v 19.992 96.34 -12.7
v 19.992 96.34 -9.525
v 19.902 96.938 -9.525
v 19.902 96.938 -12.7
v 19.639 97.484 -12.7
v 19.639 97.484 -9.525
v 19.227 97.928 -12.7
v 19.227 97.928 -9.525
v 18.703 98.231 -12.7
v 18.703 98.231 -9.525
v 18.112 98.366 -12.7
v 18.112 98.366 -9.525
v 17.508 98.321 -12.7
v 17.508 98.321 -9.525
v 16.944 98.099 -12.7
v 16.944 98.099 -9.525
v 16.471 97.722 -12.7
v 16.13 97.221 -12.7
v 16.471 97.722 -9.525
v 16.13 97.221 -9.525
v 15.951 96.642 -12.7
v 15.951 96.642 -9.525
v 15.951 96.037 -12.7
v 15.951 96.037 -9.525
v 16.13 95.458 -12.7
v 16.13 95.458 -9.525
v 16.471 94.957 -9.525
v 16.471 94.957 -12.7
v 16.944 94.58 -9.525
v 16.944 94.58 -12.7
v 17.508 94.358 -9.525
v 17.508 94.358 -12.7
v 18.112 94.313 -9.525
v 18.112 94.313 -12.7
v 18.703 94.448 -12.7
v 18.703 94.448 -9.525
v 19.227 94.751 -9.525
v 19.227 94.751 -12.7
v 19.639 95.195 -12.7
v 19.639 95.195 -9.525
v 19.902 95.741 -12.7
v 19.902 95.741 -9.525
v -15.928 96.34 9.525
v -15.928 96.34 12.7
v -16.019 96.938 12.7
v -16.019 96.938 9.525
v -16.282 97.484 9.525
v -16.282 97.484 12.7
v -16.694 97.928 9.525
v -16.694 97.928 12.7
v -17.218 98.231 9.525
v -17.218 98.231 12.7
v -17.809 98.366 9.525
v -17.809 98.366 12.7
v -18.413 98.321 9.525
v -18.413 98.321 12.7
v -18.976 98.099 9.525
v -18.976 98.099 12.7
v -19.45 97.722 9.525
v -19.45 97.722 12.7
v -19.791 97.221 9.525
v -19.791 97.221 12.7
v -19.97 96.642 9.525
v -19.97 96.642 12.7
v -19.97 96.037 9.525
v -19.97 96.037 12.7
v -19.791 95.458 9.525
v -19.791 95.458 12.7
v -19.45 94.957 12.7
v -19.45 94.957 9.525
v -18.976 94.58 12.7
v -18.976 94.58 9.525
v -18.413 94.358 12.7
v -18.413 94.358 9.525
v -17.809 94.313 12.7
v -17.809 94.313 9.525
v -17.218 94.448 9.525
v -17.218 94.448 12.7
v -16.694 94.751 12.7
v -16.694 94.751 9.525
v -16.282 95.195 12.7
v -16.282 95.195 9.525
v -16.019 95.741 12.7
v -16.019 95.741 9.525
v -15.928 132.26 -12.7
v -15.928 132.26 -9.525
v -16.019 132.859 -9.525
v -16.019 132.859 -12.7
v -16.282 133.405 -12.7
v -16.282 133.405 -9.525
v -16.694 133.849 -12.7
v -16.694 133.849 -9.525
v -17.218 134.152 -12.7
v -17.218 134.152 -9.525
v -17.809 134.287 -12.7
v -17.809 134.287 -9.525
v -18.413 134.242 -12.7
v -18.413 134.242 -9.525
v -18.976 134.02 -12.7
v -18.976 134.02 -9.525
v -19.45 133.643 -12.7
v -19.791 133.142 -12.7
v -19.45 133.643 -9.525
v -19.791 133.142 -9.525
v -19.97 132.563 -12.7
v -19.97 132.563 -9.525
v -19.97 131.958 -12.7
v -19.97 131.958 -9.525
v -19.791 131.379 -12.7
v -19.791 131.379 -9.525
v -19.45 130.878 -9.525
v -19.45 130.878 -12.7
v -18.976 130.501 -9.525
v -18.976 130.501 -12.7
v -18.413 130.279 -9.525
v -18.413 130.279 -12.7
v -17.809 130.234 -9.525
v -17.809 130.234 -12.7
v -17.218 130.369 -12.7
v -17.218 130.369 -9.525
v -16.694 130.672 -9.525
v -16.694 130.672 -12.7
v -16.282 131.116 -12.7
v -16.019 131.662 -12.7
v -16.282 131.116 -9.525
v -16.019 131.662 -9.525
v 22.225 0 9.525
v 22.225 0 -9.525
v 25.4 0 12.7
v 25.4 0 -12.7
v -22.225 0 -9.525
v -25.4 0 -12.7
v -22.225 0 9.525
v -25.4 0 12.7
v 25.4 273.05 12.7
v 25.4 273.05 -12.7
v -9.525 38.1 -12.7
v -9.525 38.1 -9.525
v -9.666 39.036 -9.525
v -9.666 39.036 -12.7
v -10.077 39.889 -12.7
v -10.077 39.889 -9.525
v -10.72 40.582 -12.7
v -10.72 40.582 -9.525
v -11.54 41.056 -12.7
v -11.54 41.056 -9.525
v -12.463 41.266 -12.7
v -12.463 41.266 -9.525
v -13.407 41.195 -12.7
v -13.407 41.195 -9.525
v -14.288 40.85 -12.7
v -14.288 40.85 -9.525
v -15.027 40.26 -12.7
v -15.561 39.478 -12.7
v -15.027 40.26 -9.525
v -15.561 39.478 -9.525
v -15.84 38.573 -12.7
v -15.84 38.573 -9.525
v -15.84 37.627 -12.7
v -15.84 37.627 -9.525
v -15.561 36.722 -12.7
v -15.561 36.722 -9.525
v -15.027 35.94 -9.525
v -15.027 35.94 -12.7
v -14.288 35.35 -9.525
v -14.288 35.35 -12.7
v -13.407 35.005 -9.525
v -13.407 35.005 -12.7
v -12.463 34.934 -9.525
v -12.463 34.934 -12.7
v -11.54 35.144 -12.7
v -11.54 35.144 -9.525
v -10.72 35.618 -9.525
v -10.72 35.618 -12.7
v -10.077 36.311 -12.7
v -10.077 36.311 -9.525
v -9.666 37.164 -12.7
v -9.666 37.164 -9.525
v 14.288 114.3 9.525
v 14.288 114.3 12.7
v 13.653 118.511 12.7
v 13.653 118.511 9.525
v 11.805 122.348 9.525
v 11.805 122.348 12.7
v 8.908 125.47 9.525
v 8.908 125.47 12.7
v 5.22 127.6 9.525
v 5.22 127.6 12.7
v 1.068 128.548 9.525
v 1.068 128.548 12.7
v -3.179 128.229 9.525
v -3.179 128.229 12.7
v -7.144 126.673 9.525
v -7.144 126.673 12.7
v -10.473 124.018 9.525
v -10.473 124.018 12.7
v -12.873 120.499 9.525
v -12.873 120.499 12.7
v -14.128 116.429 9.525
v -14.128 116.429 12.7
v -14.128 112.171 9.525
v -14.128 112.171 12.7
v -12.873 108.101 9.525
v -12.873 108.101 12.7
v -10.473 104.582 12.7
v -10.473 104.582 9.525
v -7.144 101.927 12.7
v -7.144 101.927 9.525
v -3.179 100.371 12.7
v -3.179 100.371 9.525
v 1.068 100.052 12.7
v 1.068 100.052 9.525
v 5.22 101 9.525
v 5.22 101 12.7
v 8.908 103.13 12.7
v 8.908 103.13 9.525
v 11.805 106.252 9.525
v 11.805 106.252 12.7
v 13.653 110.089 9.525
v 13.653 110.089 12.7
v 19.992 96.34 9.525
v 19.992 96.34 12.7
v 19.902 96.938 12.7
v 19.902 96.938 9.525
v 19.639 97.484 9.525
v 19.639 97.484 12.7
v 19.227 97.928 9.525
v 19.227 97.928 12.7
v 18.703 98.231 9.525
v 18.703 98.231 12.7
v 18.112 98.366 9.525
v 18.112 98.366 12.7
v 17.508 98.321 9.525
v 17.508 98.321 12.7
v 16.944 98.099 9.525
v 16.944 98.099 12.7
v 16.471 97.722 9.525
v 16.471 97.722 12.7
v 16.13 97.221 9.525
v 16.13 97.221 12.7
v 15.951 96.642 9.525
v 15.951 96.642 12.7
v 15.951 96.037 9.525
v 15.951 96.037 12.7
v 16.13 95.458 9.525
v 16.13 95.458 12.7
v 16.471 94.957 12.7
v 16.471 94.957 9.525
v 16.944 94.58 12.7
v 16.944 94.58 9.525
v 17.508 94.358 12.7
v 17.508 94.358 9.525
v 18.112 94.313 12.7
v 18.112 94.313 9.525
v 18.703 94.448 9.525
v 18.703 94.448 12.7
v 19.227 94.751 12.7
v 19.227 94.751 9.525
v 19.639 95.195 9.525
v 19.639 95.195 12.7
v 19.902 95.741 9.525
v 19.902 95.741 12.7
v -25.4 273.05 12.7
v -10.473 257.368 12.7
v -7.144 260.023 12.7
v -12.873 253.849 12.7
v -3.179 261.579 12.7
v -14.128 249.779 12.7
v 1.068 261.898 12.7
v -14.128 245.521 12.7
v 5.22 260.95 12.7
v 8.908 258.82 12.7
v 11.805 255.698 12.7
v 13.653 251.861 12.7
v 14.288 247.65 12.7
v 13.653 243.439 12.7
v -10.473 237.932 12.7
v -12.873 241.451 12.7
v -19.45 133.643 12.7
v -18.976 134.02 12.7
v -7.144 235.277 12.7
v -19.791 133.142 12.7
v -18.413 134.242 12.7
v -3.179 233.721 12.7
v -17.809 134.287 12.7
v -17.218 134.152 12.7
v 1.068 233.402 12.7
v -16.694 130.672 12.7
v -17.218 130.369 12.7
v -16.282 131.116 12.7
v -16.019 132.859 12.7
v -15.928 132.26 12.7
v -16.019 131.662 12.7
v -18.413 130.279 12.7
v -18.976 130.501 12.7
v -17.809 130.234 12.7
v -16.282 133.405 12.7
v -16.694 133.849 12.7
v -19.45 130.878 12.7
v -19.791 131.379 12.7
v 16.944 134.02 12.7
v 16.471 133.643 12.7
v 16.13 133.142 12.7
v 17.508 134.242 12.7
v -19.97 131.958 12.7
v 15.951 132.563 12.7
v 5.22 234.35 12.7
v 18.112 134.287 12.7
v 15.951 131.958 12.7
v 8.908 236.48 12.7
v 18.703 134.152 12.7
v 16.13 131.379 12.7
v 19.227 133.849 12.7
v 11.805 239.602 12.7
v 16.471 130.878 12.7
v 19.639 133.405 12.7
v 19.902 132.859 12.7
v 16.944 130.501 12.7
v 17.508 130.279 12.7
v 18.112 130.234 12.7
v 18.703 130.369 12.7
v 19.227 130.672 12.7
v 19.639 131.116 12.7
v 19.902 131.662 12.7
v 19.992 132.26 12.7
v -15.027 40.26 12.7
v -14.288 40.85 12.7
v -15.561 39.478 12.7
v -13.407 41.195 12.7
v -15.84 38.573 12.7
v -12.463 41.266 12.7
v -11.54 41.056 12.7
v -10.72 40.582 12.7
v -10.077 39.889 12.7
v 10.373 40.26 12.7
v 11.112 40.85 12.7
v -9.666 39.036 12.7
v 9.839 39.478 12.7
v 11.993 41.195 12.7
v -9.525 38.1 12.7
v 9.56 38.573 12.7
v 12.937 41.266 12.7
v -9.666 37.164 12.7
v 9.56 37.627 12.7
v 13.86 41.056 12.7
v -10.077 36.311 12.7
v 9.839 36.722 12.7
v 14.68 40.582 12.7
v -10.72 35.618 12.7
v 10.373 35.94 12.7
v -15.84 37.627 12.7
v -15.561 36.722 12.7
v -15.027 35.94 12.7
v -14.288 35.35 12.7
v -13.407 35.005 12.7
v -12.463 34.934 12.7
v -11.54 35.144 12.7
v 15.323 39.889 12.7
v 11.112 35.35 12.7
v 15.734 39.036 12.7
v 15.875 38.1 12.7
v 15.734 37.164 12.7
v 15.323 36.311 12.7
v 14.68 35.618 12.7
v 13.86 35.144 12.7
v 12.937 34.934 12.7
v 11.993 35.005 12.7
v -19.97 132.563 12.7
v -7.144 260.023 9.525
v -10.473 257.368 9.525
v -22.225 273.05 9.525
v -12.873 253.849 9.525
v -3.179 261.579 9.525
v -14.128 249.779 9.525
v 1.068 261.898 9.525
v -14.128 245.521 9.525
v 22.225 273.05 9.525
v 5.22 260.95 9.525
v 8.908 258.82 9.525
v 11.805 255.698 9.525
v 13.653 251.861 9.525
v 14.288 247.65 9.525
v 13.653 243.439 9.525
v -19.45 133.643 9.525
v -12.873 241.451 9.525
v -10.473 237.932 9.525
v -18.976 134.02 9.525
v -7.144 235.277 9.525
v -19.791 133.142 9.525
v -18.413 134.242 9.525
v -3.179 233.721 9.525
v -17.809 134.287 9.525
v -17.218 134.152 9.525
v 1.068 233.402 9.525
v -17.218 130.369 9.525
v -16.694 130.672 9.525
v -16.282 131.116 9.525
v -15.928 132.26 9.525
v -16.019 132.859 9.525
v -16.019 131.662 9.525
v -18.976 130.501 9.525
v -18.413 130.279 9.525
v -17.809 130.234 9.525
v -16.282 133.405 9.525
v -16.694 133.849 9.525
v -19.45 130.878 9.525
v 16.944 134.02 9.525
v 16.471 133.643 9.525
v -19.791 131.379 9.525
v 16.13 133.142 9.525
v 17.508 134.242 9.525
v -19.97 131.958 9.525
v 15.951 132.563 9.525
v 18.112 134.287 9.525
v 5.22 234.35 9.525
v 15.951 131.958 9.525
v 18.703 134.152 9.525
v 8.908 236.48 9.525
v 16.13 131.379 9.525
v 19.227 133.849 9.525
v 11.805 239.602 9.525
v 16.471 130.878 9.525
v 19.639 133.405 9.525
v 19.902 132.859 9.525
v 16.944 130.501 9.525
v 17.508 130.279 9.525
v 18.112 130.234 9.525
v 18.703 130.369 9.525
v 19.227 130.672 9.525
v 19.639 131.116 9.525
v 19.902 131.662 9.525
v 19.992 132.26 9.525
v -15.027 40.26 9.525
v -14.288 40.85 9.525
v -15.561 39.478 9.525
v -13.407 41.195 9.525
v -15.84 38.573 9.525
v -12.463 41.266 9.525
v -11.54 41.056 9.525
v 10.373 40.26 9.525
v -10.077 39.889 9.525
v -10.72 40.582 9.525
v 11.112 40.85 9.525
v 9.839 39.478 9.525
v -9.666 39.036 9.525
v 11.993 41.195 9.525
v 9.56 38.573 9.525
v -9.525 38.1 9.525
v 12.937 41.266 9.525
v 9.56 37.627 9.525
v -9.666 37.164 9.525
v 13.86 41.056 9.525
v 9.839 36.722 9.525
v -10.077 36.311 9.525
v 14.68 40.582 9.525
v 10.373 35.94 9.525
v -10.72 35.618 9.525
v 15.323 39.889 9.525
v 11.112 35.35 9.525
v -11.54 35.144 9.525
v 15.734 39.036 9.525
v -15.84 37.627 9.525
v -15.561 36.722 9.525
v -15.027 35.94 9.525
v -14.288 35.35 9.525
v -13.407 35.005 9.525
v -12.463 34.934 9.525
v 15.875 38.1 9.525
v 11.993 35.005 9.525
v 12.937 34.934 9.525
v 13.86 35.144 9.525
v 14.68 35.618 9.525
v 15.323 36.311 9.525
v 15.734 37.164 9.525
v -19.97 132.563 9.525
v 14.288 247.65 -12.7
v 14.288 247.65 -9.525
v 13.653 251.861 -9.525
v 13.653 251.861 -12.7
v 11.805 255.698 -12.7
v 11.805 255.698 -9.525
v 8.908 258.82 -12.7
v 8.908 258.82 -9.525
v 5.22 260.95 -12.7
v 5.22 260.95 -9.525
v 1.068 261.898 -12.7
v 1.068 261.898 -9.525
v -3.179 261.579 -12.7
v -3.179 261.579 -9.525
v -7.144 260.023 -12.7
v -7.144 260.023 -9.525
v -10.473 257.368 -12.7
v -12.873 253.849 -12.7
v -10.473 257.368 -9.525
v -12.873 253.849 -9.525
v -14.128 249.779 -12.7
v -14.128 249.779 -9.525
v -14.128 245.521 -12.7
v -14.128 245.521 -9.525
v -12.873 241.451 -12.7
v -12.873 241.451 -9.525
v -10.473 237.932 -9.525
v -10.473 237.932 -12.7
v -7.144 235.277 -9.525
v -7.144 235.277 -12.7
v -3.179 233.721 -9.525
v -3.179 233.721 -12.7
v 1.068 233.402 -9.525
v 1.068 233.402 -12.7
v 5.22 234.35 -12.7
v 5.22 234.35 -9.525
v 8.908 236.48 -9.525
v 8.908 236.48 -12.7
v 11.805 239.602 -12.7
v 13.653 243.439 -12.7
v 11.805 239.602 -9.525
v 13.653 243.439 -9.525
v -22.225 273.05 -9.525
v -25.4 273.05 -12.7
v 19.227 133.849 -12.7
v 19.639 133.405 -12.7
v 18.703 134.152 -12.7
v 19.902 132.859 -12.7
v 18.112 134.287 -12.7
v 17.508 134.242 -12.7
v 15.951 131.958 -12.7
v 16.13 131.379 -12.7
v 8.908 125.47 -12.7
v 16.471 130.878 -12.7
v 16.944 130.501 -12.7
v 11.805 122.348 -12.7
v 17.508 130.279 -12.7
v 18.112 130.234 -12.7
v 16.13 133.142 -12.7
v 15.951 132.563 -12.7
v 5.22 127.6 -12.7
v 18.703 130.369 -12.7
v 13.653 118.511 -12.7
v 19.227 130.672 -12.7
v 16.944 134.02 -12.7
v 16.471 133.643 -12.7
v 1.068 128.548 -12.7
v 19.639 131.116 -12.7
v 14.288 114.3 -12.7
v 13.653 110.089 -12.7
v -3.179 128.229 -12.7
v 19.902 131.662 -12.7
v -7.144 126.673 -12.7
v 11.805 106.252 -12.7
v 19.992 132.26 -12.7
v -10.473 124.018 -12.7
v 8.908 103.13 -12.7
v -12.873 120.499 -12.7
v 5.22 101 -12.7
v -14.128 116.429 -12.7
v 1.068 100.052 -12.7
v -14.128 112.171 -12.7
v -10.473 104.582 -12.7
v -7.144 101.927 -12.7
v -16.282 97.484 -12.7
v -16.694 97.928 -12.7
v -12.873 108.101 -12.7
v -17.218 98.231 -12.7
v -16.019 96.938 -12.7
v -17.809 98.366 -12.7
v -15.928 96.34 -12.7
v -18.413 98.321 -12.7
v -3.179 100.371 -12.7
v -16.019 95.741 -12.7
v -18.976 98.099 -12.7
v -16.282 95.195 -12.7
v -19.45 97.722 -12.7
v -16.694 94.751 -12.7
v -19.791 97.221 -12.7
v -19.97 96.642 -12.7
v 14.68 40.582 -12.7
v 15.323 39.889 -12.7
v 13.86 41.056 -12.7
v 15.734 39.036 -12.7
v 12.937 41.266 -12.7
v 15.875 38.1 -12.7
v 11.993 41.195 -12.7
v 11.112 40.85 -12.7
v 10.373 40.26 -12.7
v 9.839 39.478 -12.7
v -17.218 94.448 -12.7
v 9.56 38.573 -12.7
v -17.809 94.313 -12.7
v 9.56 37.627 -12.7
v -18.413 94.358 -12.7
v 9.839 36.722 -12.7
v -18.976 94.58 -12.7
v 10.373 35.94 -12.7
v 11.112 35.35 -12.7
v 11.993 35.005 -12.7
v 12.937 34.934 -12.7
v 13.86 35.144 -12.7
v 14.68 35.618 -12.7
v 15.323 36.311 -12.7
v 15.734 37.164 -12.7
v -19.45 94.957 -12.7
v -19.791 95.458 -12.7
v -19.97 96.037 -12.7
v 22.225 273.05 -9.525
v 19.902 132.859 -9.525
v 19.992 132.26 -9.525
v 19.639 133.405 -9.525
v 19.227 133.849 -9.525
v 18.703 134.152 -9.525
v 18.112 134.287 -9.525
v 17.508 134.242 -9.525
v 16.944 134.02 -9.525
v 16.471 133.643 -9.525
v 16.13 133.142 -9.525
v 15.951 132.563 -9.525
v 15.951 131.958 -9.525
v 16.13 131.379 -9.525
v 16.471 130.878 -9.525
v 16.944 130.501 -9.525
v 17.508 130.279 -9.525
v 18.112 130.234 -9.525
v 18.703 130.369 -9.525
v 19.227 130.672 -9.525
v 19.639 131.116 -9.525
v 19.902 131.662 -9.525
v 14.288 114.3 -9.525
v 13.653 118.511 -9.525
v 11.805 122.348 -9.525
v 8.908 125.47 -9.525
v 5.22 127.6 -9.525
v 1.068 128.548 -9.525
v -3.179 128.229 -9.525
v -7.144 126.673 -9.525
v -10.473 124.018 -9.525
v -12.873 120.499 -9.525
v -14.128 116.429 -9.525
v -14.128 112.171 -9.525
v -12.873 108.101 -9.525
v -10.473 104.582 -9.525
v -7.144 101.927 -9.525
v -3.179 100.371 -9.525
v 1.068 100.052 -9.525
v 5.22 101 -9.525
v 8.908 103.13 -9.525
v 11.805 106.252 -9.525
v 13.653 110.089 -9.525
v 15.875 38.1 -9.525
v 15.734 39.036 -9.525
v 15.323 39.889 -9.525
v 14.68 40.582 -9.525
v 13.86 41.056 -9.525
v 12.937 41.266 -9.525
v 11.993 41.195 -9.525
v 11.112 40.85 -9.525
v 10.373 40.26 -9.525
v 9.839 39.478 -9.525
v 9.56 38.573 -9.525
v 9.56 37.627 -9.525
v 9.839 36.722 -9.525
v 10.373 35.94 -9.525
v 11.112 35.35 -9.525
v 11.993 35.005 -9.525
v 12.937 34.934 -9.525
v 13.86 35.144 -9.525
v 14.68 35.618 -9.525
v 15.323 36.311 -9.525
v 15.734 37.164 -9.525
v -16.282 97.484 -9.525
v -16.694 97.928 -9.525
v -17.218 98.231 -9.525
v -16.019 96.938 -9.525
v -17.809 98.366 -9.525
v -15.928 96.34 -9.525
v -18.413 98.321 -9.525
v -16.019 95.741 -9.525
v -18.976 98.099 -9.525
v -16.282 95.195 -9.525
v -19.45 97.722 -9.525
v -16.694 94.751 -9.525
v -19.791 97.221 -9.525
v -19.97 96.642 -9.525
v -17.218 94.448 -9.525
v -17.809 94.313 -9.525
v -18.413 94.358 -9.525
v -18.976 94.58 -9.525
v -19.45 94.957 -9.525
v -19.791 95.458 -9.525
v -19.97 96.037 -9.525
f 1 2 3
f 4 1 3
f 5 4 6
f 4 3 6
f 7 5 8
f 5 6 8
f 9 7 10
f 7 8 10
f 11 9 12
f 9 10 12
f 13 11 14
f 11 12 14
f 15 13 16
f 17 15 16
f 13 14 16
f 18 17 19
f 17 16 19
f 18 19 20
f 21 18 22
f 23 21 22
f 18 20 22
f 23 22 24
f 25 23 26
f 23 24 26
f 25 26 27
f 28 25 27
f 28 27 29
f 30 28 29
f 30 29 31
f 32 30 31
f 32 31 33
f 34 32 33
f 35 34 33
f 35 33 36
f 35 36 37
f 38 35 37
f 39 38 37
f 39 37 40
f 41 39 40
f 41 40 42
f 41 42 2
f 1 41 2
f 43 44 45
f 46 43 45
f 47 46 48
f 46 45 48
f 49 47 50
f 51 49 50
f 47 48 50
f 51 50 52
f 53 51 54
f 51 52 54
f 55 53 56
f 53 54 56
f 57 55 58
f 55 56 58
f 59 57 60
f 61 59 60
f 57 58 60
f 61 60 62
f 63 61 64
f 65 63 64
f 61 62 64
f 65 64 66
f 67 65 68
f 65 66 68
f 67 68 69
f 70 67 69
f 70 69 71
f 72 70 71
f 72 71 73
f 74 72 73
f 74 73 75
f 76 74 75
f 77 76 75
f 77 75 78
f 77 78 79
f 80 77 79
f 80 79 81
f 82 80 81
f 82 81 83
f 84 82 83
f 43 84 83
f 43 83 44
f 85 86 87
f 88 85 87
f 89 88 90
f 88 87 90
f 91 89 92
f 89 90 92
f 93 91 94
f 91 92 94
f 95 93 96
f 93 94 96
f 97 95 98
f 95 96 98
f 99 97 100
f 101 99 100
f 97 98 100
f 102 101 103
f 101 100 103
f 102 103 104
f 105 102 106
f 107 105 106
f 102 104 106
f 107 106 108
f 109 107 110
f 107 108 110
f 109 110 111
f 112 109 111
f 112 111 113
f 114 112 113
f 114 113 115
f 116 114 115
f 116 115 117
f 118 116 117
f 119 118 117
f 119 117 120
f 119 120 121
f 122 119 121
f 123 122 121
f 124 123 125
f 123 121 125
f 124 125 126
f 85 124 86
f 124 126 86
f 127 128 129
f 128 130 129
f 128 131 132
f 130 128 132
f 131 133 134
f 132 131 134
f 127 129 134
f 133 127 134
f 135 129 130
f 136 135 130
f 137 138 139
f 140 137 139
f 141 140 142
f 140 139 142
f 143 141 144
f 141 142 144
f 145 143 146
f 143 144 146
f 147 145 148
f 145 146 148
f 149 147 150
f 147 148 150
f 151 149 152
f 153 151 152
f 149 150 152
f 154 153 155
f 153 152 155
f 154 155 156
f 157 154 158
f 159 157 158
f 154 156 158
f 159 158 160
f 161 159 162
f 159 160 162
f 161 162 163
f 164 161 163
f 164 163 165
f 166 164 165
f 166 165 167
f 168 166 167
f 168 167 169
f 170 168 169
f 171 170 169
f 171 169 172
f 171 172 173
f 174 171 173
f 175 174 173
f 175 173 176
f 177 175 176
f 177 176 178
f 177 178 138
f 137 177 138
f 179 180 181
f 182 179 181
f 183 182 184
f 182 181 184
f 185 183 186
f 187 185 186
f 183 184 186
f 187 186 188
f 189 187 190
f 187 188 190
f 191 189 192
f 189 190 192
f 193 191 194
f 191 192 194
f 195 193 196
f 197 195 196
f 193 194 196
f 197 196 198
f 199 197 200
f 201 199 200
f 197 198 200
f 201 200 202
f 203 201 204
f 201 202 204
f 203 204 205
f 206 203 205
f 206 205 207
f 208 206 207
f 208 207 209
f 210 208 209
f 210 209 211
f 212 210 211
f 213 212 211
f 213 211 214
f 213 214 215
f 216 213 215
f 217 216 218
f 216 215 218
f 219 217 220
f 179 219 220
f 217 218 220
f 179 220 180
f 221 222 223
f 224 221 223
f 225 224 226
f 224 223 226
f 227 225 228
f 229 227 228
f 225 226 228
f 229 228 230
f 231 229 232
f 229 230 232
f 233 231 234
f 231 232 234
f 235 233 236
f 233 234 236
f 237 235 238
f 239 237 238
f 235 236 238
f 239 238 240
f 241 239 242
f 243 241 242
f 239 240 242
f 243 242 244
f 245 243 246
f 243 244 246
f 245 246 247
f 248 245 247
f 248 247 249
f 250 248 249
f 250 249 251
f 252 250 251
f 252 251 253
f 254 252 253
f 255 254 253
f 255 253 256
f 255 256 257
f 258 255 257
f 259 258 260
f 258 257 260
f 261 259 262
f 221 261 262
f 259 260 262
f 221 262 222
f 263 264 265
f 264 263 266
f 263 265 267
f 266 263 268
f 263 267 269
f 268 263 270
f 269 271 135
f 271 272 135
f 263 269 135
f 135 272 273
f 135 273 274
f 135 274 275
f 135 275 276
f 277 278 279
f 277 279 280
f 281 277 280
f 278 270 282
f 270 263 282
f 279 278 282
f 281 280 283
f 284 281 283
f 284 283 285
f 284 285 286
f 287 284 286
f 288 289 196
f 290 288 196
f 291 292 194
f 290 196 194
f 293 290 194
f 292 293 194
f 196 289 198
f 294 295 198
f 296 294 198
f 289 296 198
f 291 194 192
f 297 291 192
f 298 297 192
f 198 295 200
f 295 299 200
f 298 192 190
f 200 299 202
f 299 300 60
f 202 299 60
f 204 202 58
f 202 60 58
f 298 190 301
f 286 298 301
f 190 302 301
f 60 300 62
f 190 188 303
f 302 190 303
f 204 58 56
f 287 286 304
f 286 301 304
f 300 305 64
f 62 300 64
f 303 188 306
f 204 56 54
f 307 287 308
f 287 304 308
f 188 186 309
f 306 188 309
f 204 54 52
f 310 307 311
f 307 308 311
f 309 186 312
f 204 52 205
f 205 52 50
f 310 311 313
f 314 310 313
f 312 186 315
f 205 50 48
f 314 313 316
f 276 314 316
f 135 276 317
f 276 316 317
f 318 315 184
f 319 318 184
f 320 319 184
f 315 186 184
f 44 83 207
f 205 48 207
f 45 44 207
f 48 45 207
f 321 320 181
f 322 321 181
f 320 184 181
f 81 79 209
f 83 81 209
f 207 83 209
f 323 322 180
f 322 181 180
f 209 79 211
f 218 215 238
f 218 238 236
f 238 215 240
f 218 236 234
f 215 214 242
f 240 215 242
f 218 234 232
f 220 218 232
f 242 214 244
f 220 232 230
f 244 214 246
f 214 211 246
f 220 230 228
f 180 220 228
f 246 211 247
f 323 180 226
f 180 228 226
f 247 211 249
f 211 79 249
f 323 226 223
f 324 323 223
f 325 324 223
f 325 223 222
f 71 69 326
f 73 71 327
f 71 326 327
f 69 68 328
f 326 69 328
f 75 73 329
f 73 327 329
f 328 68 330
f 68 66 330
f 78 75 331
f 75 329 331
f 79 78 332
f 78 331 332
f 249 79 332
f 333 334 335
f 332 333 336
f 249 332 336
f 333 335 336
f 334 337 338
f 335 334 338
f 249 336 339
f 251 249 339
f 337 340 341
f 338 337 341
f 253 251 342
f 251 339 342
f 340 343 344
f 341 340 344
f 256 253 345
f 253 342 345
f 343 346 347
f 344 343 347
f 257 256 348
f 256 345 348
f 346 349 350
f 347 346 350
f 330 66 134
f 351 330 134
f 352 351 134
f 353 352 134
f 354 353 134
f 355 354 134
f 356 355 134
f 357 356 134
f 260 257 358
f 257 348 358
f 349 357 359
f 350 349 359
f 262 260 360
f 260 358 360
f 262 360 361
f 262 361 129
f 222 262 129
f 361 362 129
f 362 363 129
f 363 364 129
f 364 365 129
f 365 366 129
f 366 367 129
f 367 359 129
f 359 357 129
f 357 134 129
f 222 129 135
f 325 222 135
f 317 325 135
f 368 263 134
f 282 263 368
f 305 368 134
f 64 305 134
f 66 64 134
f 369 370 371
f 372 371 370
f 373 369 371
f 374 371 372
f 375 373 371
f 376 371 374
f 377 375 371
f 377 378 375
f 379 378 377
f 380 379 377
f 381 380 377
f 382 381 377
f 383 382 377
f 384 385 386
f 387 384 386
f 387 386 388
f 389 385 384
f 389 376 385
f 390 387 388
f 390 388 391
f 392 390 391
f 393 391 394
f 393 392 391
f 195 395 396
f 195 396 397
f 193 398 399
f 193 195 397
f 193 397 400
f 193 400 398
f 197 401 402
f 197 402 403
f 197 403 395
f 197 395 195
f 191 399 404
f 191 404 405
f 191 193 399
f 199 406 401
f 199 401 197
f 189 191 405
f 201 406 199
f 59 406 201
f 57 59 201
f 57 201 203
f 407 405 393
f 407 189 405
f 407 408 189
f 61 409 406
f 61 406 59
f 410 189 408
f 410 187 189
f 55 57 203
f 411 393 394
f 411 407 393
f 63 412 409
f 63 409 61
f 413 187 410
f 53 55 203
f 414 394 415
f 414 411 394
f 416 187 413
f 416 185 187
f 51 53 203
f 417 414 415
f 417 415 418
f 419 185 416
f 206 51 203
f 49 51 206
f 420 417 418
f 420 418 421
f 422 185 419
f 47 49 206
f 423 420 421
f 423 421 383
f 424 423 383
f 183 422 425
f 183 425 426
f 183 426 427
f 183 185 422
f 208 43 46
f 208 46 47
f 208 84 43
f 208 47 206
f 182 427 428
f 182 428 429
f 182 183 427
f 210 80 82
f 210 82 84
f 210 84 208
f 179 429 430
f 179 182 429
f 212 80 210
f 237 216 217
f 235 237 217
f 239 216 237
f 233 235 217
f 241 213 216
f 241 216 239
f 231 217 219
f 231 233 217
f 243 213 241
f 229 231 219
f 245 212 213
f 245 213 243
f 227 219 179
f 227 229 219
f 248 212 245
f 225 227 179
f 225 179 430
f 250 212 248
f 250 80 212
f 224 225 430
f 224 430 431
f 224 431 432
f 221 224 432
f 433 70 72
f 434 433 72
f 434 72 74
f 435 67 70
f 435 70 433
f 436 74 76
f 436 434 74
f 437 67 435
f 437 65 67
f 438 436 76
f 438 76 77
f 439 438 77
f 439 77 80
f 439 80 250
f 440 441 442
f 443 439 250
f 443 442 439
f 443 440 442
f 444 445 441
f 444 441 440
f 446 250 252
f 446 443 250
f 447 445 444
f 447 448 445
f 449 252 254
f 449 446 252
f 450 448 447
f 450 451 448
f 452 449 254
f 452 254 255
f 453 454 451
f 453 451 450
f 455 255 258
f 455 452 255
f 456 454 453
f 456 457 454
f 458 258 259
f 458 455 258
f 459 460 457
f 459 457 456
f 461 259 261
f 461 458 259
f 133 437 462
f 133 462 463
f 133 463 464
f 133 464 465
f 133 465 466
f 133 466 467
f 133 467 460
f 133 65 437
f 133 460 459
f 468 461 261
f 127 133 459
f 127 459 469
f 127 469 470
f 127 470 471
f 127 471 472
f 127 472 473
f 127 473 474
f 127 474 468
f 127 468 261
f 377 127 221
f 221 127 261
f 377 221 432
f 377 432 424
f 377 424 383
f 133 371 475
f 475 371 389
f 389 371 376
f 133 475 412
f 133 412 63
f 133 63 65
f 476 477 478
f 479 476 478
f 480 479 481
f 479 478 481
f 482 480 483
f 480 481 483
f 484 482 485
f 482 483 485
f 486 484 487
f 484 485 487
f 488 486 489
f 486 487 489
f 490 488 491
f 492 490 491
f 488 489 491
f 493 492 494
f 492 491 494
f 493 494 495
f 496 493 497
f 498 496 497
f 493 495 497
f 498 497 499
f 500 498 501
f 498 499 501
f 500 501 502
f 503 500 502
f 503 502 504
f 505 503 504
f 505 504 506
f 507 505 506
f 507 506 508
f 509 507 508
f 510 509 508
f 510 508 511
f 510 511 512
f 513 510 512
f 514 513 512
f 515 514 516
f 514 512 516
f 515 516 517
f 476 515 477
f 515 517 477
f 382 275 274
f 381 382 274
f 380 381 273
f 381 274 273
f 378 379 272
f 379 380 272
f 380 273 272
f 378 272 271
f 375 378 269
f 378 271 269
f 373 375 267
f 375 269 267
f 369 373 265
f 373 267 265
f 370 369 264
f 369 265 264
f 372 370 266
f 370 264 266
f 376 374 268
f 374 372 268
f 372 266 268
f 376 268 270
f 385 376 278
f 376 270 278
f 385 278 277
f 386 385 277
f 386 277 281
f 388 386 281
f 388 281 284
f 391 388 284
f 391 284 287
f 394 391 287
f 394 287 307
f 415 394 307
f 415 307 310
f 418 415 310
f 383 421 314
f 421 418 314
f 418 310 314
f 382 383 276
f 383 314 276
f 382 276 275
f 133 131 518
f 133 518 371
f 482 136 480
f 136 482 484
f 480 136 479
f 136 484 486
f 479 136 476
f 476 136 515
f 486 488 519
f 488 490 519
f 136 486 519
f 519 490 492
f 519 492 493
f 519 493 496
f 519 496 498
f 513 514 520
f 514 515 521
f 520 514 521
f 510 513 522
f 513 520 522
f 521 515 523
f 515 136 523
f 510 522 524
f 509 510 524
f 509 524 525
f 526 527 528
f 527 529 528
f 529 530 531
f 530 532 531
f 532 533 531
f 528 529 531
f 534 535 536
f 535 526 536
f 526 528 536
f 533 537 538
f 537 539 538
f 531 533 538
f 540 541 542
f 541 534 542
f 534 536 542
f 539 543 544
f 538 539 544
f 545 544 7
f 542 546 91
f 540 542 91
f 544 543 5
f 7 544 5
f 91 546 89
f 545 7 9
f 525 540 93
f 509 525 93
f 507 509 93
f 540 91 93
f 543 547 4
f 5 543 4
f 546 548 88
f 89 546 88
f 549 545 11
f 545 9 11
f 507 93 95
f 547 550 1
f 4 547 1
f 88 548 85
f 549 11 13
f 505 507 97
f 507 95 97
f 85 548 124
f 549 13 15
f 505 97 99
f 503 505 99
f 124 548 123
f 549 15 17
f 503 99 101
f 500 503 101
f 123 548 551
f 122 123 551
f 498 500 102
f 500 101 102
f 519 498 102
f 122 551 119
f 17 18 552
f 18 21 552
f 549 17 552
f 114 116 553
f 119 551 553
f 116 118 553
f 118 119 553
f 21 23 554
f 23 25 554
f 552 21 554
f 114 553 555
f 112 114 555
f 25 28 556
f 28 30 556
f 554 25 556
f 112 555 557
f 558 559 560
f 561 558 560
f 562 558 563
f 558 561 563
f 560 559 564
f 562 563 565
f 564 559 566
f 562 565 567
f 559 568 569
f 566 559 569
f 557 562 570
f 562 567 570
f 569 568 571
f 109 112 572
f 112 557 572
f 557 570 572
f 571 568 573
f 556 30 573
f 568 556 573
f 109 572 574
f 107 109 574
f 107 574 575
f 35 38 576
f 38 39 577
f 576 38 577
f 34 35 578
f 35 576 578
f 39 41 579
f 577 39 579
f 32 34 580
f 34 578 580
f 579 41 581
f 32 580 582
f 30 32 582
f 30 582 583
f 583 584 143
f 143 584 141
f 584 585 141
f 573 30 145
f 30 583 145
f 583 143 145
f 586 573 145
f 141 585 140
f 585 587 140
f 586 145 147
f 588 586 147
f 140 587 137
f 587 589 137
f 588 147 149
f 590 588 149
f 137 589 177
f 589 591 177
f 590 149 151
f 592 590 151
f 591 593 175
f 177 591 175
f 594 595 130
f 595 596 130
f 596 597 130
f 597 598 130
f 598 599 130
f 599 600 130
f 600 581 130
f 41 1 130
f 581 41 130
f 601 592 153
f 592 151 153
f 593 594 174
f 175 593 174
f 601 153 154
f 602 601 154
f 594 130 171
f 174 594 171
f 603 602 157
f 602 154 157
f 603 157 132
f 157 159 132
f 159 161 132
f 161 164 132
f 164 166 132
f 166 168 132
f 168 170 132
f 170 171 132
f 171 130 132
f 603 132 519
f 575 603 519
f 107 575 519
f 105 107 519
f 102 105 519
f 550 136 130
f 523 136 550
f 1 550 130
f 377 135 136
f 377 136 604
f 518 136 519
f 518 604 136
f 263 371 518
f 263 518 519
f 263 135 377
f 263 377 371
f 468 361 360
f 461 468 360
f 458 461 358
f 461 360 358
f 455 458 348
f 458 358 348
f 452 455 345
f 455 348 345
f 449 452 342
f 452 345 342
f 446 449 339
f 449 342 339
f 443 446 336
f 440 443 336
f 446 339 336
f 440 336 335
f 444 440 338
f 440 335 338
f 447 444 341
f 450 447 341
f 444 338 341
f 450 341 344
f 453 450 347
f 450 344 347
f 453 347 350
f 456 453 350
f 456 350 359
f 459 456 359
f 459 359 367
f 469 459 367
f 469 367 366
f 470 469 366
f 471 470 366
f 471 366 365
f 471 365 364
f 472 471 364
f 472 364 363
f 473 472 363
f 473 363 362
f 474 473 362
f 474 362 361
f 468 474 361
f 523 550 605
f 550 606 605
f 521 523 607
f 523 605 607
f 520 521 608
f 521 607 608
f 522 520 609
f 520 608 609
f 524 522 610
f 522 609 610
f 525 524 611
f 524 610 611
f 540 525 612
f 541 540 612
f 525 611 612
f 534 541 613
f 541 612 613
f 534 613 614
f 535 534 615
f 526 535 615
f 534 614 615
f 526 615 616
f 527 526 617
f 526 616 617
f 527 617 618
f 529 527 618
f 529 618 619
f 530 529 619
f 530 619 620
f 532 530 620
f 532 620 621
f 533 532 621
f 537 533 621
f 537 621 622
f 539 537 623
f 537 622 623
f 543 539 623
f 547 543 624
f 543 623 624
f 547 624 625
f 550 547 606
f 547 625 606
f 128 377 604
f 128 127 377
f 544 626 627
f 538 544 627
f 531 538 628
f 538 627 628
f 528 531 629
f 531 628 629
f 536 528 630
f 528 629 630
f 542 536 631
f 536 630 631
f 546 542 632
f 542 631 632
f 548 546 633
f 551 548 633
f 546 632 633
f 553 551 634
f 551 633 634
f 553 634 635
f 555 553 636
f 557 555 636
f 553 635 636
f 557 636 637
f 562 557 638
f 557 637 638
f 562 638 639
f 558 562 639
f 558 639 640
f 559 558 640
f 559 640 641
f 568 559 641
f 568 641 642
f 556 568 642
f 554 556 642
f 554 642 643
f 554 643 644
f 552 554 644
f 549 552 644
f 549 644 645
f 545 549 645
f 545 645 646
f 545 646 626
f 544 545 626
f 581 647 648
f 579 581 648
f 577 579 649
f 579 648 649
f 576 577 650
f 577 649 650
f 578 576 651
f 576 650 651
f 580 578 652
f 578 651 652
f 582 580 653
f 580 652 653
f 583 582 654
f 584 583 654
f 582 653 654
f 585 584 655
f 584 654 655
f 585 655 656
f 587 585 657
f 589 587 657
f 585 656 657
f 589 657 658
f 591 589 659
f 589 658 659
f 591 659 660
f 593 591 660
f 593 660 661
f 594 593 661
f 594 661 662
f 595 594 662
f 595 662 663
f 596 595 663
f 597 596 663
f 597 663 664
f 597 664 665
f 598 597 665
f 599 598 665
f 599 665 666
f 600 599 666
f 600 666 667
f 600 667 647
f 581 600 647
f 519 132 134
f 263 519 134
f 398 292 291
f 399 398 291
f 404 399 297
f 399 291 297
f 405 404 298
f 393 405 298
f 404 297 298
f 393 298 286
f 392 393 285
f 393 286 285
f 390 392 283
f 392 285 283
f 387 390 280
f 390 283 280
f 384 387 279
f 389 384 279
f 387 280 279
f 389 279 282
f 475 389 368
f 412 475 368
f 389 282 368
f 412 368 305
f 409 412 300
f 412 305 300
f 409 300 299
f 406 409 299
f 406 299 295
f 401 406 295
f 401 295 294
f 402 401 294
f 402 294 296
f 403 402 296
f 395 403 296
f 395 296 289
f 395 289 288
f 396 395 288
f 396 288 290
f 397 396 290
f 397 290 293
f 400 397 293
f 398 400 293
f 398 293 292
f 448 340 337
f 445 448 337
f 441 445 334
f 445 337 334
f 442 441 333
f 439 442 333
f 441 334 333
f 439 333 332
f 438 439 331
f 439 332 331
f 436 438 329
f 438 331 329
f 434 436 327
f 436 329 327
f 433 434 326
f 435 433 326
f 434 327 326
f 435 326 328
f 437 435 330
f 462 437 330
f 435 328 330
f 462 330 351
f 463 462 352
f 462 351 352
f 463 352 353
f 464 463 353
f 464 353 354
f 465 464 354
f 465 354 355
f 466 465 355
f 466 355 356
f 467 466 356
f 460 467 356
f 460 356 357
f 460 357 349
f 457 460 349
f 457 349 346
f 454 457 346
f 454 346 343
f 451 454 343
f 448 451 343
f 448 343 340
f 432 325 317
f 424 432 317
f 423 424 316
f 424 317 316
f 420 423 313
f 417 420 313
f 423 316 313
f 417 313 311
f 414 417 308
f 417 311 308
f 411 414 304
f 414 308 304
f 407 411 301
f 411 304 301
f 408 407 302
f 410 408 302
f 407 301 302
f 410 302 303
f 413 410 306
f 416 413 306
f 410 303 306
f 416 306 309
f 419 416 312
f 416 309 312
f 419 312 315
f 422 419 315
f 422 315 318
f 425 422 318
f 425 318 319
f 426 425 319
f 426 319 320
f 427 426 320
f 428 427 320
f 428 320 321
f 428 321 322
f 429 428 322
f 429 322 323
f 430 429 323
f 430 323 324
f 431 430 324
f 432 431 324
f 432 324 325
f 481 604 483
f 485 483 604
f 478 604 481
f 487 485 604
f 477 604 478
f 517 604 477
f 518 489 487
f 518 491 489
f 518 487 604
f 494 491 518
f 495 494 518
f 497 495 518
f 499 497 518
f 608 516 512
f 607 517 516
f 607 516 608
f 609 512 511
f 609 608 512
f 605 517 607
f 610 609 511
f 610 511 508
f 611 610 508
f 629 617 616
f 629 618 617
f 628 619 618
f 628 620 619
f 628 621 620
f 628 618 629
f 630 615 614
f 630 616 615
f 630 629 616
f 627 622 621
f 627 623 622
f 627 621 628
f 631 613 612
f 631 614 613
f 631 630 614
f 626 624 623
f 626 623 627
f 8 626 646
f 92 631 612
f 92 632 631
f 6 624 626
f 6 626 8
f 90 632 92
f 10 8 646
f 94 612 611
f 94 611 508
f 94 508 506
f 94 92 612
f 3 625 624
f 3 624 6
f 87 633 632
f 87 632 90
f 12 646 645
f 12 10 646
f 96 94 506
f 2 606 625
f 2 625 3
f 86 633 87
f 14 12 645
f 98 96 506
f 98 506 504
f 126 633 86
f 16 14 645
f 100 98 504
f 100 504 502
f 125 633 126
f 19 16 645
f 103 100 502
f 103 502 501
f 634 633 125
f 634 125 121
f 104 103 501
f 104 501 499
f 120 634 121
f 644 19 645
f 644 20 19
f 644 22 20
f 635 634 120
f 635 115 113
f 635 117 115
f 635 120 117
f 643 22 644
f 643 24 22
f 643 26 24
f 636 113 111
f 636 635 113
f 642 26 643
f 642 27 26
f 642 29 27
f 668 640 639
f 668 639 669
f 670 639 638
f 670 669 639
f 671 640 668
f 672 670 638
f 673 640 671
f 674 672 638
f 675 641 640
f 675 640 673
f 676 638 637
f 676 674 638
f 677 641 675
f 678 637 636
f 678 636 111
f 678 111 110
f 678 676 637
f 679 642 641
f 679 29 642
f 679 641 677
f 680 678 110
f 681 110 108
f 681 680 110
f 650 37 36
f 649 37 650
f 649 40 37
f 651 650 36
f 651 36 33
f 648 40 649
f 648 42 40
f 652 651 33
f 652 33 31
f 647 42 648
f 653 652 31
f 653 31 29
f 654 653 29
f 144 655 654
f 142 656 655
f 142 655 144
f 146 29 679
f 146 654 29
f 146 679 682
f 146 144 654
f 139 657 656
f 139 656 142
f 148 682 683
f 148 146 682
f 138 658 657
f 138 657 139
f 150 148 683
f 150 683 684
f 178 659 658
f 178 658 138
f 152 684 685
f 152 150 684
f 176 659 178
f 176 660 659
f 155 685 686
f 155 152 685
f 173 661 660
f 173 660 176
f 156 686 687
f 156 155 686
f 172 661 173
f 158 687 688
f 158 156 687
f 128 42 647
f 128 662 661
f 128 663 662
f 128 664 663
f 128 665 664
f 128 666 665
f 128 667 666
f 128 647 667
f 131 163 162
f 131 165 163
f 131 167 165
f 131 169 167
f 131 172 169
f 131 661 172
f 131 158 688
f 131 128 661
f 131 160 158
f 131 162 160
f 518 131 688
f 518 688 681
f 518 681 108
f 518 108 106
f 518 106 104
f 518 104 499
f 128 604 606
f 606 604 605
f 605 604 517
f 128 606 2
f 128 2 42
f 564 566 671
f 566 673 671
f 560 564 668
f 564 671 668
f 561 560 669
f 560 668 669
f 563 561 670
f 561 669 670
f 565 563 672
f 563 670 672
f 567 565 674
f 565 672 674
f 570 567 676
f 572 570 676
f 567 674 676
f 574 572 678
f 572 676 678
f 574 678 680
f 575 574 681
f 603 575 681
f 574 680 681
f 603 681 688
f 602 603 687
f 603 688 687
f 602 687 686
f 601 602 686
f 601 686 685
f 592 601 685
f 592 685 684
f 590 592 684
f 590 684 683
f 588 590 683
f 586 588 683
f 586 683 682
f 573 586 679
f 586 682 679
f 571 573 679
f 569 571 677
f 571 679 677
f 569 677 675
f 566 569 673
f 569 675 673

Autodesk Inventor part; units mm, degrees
ref_plane "YZ Plane" through (0, 0, 0) normal (1, 0, 0) x (0, 1, 0)
ref_plane "XZ Plane" through (0, 0, 0) normal (0, 1, 0) x (-1, 0, 0)
ref_plane "XY Plane" through (0, 0, 0) normal (0, 0, 1) x (1, 0, 0)
sketch "Sketch1" plane through (0, 0, 0) normal (0, 1, 0) x (-1, 0, 0)
  line L0 (25.4, 12.7) -> (-25.4, 12.7)
  line L1 (-25.4, 12.7) -> (-25.4, -12.7)
  line L2 (-25.4, -12.7) -> (25.4, -12.7)
  line L3 (25.4, -12.7) -> (25.4, 12.7)
  line L4 (25.4, 12.7) -> (-25.4, -12.7) construction
  line L5 (-25.4, 12.7) -> (25.4, -12.7) construction
  line L6 (22.225, 9.525) -> (-22.225, 9.525)
  line L7 (-22.225, 9.525) -> (-22.225, -9.525)
  line L8 (-22.225, -9.525) -> (22.225, -9.525)
  line L9 (22.225, -9.525) -> (22.225, 9.525)
  line L10 (22.225, 9.525) -> (-22.225, -9.525) construction
  line L11 (-22.225, 9.525) -> (22.225, -9.525) construction
  point P0 (0, 0)
  dimension "d0" = 50.8
  dimension "d1" = 25.4
  dimension "d2" = 44.45
  dimension "d3" = 19.05
extrude "Extrusion1" add sketch "Sketch1" along normal blind 273.05
sketch "Sketch2" plane through (-25.4, 0, 12.7) normal (0, 0, 1) x (1, 0, 0)
  line L0 (0, 0) -> (0, 273.05) projected
  line L1 (25.4, 0) -> (25.4, 38.1)
  line L2 (25.4, 0) -> (63.5, 0) construction
  line L3 (25.4, 38.1) -> (38.1, 38.1)
  line L4 (38.1, 38.1) -> (12.7, 38.1)
  circle A0 centre (12.7, 38.1) radius 3.175
  circle A1 centre (38.1, 38.1) radius 3.175
  dimension "d6" = 38.1
  dimension "d7" = 90
  dimension "d8" = 12.7
  dimension "d9" = 90
  dimension "d10" = 25.4
  dimension "d11" = 0
  dimension "d12" = 6.35
  dimension "d13" = 6.35
extrude "Extrusion2" cut sketch "Sketch2" against normal blind 203.2
sketch "Sketch3" plane through (-25.4, 0, 12.7) normal (0, 0, 1) x (1, 0, 0)
  line L0 (0, 273.05) -> (50.8, 273.05) projected
  line L1 (0, 0) -> (0, 273.05) projected
  line L2 (25.4, 273.05) -> (25.4, 247.65)
  line L3 (25.4, 273.05) -> (50.8, 273.05) construction
  circle A0 centre (25.4, 247.65) radius 14.2875
  point P0 (25.4, 0)
  dimension "d16" = 25.4
  dimension "d17" = 90
  dimension "d18" = 28.575
extrude "Extrusion3" cut sketch "Sketch3" against normal blind 25.4
sketch "Sketch4" plane through (-25.4, 0, 12.7) normal (0, 0, 1) x (1, 0, 0)
  line L0 (0, 0) -> (50.8, 0)
  line L1 (50.8, 0) -> (50.8, 76.2)
  line L2 (0, 76.2) -> (0, 0)
  line L3 (50.8, 76.2) -> (0, 76.2)
  line L4 (0, 76.2) -> (0, 127)
  line L5 (50.8, 127) -> (50.8, 76.2)
  circle A0 centre (25.4, 114.3) radius 14.2875
  line L6 (25.4, 114.3) -> (50.8, 114.3) construction
  circle A1 centre (7.4395, 132.2605) radius 2.032
  circle A2 centre (7.4395, 96.3395) radius 2.032
  circle A3 centre (43.3605, 96.3395) radius 2.032
  circle A4 centre (43.3605, 132.2605) radius 2.032
  point P0 (25.4, 0)
  dimension "d21" = 50.8
  dimension "d22" = 76.2
  dimension "d23" = 50.8
  dimension "d24" = 50.8
  dimension "d25" = 28.575
  dimension "d29" = 4.064
  dimension "d30" = 4.064
  dimension "d31" = 4.064
  dimension "d32" = 4.064
  dimension "d35" = 38.1
  dimension "d36" = 56.0605
  dimension "d37" = 56.0605
  dimension "d38" = 20.1395
  dimension "d39" = 20.1395
extrude "Extrusion4" cut sketch "Sketch4" against normal blind 25.4 contours A0 | A1 | A2 | A3 | A4
properties part number "ArmSupport"
